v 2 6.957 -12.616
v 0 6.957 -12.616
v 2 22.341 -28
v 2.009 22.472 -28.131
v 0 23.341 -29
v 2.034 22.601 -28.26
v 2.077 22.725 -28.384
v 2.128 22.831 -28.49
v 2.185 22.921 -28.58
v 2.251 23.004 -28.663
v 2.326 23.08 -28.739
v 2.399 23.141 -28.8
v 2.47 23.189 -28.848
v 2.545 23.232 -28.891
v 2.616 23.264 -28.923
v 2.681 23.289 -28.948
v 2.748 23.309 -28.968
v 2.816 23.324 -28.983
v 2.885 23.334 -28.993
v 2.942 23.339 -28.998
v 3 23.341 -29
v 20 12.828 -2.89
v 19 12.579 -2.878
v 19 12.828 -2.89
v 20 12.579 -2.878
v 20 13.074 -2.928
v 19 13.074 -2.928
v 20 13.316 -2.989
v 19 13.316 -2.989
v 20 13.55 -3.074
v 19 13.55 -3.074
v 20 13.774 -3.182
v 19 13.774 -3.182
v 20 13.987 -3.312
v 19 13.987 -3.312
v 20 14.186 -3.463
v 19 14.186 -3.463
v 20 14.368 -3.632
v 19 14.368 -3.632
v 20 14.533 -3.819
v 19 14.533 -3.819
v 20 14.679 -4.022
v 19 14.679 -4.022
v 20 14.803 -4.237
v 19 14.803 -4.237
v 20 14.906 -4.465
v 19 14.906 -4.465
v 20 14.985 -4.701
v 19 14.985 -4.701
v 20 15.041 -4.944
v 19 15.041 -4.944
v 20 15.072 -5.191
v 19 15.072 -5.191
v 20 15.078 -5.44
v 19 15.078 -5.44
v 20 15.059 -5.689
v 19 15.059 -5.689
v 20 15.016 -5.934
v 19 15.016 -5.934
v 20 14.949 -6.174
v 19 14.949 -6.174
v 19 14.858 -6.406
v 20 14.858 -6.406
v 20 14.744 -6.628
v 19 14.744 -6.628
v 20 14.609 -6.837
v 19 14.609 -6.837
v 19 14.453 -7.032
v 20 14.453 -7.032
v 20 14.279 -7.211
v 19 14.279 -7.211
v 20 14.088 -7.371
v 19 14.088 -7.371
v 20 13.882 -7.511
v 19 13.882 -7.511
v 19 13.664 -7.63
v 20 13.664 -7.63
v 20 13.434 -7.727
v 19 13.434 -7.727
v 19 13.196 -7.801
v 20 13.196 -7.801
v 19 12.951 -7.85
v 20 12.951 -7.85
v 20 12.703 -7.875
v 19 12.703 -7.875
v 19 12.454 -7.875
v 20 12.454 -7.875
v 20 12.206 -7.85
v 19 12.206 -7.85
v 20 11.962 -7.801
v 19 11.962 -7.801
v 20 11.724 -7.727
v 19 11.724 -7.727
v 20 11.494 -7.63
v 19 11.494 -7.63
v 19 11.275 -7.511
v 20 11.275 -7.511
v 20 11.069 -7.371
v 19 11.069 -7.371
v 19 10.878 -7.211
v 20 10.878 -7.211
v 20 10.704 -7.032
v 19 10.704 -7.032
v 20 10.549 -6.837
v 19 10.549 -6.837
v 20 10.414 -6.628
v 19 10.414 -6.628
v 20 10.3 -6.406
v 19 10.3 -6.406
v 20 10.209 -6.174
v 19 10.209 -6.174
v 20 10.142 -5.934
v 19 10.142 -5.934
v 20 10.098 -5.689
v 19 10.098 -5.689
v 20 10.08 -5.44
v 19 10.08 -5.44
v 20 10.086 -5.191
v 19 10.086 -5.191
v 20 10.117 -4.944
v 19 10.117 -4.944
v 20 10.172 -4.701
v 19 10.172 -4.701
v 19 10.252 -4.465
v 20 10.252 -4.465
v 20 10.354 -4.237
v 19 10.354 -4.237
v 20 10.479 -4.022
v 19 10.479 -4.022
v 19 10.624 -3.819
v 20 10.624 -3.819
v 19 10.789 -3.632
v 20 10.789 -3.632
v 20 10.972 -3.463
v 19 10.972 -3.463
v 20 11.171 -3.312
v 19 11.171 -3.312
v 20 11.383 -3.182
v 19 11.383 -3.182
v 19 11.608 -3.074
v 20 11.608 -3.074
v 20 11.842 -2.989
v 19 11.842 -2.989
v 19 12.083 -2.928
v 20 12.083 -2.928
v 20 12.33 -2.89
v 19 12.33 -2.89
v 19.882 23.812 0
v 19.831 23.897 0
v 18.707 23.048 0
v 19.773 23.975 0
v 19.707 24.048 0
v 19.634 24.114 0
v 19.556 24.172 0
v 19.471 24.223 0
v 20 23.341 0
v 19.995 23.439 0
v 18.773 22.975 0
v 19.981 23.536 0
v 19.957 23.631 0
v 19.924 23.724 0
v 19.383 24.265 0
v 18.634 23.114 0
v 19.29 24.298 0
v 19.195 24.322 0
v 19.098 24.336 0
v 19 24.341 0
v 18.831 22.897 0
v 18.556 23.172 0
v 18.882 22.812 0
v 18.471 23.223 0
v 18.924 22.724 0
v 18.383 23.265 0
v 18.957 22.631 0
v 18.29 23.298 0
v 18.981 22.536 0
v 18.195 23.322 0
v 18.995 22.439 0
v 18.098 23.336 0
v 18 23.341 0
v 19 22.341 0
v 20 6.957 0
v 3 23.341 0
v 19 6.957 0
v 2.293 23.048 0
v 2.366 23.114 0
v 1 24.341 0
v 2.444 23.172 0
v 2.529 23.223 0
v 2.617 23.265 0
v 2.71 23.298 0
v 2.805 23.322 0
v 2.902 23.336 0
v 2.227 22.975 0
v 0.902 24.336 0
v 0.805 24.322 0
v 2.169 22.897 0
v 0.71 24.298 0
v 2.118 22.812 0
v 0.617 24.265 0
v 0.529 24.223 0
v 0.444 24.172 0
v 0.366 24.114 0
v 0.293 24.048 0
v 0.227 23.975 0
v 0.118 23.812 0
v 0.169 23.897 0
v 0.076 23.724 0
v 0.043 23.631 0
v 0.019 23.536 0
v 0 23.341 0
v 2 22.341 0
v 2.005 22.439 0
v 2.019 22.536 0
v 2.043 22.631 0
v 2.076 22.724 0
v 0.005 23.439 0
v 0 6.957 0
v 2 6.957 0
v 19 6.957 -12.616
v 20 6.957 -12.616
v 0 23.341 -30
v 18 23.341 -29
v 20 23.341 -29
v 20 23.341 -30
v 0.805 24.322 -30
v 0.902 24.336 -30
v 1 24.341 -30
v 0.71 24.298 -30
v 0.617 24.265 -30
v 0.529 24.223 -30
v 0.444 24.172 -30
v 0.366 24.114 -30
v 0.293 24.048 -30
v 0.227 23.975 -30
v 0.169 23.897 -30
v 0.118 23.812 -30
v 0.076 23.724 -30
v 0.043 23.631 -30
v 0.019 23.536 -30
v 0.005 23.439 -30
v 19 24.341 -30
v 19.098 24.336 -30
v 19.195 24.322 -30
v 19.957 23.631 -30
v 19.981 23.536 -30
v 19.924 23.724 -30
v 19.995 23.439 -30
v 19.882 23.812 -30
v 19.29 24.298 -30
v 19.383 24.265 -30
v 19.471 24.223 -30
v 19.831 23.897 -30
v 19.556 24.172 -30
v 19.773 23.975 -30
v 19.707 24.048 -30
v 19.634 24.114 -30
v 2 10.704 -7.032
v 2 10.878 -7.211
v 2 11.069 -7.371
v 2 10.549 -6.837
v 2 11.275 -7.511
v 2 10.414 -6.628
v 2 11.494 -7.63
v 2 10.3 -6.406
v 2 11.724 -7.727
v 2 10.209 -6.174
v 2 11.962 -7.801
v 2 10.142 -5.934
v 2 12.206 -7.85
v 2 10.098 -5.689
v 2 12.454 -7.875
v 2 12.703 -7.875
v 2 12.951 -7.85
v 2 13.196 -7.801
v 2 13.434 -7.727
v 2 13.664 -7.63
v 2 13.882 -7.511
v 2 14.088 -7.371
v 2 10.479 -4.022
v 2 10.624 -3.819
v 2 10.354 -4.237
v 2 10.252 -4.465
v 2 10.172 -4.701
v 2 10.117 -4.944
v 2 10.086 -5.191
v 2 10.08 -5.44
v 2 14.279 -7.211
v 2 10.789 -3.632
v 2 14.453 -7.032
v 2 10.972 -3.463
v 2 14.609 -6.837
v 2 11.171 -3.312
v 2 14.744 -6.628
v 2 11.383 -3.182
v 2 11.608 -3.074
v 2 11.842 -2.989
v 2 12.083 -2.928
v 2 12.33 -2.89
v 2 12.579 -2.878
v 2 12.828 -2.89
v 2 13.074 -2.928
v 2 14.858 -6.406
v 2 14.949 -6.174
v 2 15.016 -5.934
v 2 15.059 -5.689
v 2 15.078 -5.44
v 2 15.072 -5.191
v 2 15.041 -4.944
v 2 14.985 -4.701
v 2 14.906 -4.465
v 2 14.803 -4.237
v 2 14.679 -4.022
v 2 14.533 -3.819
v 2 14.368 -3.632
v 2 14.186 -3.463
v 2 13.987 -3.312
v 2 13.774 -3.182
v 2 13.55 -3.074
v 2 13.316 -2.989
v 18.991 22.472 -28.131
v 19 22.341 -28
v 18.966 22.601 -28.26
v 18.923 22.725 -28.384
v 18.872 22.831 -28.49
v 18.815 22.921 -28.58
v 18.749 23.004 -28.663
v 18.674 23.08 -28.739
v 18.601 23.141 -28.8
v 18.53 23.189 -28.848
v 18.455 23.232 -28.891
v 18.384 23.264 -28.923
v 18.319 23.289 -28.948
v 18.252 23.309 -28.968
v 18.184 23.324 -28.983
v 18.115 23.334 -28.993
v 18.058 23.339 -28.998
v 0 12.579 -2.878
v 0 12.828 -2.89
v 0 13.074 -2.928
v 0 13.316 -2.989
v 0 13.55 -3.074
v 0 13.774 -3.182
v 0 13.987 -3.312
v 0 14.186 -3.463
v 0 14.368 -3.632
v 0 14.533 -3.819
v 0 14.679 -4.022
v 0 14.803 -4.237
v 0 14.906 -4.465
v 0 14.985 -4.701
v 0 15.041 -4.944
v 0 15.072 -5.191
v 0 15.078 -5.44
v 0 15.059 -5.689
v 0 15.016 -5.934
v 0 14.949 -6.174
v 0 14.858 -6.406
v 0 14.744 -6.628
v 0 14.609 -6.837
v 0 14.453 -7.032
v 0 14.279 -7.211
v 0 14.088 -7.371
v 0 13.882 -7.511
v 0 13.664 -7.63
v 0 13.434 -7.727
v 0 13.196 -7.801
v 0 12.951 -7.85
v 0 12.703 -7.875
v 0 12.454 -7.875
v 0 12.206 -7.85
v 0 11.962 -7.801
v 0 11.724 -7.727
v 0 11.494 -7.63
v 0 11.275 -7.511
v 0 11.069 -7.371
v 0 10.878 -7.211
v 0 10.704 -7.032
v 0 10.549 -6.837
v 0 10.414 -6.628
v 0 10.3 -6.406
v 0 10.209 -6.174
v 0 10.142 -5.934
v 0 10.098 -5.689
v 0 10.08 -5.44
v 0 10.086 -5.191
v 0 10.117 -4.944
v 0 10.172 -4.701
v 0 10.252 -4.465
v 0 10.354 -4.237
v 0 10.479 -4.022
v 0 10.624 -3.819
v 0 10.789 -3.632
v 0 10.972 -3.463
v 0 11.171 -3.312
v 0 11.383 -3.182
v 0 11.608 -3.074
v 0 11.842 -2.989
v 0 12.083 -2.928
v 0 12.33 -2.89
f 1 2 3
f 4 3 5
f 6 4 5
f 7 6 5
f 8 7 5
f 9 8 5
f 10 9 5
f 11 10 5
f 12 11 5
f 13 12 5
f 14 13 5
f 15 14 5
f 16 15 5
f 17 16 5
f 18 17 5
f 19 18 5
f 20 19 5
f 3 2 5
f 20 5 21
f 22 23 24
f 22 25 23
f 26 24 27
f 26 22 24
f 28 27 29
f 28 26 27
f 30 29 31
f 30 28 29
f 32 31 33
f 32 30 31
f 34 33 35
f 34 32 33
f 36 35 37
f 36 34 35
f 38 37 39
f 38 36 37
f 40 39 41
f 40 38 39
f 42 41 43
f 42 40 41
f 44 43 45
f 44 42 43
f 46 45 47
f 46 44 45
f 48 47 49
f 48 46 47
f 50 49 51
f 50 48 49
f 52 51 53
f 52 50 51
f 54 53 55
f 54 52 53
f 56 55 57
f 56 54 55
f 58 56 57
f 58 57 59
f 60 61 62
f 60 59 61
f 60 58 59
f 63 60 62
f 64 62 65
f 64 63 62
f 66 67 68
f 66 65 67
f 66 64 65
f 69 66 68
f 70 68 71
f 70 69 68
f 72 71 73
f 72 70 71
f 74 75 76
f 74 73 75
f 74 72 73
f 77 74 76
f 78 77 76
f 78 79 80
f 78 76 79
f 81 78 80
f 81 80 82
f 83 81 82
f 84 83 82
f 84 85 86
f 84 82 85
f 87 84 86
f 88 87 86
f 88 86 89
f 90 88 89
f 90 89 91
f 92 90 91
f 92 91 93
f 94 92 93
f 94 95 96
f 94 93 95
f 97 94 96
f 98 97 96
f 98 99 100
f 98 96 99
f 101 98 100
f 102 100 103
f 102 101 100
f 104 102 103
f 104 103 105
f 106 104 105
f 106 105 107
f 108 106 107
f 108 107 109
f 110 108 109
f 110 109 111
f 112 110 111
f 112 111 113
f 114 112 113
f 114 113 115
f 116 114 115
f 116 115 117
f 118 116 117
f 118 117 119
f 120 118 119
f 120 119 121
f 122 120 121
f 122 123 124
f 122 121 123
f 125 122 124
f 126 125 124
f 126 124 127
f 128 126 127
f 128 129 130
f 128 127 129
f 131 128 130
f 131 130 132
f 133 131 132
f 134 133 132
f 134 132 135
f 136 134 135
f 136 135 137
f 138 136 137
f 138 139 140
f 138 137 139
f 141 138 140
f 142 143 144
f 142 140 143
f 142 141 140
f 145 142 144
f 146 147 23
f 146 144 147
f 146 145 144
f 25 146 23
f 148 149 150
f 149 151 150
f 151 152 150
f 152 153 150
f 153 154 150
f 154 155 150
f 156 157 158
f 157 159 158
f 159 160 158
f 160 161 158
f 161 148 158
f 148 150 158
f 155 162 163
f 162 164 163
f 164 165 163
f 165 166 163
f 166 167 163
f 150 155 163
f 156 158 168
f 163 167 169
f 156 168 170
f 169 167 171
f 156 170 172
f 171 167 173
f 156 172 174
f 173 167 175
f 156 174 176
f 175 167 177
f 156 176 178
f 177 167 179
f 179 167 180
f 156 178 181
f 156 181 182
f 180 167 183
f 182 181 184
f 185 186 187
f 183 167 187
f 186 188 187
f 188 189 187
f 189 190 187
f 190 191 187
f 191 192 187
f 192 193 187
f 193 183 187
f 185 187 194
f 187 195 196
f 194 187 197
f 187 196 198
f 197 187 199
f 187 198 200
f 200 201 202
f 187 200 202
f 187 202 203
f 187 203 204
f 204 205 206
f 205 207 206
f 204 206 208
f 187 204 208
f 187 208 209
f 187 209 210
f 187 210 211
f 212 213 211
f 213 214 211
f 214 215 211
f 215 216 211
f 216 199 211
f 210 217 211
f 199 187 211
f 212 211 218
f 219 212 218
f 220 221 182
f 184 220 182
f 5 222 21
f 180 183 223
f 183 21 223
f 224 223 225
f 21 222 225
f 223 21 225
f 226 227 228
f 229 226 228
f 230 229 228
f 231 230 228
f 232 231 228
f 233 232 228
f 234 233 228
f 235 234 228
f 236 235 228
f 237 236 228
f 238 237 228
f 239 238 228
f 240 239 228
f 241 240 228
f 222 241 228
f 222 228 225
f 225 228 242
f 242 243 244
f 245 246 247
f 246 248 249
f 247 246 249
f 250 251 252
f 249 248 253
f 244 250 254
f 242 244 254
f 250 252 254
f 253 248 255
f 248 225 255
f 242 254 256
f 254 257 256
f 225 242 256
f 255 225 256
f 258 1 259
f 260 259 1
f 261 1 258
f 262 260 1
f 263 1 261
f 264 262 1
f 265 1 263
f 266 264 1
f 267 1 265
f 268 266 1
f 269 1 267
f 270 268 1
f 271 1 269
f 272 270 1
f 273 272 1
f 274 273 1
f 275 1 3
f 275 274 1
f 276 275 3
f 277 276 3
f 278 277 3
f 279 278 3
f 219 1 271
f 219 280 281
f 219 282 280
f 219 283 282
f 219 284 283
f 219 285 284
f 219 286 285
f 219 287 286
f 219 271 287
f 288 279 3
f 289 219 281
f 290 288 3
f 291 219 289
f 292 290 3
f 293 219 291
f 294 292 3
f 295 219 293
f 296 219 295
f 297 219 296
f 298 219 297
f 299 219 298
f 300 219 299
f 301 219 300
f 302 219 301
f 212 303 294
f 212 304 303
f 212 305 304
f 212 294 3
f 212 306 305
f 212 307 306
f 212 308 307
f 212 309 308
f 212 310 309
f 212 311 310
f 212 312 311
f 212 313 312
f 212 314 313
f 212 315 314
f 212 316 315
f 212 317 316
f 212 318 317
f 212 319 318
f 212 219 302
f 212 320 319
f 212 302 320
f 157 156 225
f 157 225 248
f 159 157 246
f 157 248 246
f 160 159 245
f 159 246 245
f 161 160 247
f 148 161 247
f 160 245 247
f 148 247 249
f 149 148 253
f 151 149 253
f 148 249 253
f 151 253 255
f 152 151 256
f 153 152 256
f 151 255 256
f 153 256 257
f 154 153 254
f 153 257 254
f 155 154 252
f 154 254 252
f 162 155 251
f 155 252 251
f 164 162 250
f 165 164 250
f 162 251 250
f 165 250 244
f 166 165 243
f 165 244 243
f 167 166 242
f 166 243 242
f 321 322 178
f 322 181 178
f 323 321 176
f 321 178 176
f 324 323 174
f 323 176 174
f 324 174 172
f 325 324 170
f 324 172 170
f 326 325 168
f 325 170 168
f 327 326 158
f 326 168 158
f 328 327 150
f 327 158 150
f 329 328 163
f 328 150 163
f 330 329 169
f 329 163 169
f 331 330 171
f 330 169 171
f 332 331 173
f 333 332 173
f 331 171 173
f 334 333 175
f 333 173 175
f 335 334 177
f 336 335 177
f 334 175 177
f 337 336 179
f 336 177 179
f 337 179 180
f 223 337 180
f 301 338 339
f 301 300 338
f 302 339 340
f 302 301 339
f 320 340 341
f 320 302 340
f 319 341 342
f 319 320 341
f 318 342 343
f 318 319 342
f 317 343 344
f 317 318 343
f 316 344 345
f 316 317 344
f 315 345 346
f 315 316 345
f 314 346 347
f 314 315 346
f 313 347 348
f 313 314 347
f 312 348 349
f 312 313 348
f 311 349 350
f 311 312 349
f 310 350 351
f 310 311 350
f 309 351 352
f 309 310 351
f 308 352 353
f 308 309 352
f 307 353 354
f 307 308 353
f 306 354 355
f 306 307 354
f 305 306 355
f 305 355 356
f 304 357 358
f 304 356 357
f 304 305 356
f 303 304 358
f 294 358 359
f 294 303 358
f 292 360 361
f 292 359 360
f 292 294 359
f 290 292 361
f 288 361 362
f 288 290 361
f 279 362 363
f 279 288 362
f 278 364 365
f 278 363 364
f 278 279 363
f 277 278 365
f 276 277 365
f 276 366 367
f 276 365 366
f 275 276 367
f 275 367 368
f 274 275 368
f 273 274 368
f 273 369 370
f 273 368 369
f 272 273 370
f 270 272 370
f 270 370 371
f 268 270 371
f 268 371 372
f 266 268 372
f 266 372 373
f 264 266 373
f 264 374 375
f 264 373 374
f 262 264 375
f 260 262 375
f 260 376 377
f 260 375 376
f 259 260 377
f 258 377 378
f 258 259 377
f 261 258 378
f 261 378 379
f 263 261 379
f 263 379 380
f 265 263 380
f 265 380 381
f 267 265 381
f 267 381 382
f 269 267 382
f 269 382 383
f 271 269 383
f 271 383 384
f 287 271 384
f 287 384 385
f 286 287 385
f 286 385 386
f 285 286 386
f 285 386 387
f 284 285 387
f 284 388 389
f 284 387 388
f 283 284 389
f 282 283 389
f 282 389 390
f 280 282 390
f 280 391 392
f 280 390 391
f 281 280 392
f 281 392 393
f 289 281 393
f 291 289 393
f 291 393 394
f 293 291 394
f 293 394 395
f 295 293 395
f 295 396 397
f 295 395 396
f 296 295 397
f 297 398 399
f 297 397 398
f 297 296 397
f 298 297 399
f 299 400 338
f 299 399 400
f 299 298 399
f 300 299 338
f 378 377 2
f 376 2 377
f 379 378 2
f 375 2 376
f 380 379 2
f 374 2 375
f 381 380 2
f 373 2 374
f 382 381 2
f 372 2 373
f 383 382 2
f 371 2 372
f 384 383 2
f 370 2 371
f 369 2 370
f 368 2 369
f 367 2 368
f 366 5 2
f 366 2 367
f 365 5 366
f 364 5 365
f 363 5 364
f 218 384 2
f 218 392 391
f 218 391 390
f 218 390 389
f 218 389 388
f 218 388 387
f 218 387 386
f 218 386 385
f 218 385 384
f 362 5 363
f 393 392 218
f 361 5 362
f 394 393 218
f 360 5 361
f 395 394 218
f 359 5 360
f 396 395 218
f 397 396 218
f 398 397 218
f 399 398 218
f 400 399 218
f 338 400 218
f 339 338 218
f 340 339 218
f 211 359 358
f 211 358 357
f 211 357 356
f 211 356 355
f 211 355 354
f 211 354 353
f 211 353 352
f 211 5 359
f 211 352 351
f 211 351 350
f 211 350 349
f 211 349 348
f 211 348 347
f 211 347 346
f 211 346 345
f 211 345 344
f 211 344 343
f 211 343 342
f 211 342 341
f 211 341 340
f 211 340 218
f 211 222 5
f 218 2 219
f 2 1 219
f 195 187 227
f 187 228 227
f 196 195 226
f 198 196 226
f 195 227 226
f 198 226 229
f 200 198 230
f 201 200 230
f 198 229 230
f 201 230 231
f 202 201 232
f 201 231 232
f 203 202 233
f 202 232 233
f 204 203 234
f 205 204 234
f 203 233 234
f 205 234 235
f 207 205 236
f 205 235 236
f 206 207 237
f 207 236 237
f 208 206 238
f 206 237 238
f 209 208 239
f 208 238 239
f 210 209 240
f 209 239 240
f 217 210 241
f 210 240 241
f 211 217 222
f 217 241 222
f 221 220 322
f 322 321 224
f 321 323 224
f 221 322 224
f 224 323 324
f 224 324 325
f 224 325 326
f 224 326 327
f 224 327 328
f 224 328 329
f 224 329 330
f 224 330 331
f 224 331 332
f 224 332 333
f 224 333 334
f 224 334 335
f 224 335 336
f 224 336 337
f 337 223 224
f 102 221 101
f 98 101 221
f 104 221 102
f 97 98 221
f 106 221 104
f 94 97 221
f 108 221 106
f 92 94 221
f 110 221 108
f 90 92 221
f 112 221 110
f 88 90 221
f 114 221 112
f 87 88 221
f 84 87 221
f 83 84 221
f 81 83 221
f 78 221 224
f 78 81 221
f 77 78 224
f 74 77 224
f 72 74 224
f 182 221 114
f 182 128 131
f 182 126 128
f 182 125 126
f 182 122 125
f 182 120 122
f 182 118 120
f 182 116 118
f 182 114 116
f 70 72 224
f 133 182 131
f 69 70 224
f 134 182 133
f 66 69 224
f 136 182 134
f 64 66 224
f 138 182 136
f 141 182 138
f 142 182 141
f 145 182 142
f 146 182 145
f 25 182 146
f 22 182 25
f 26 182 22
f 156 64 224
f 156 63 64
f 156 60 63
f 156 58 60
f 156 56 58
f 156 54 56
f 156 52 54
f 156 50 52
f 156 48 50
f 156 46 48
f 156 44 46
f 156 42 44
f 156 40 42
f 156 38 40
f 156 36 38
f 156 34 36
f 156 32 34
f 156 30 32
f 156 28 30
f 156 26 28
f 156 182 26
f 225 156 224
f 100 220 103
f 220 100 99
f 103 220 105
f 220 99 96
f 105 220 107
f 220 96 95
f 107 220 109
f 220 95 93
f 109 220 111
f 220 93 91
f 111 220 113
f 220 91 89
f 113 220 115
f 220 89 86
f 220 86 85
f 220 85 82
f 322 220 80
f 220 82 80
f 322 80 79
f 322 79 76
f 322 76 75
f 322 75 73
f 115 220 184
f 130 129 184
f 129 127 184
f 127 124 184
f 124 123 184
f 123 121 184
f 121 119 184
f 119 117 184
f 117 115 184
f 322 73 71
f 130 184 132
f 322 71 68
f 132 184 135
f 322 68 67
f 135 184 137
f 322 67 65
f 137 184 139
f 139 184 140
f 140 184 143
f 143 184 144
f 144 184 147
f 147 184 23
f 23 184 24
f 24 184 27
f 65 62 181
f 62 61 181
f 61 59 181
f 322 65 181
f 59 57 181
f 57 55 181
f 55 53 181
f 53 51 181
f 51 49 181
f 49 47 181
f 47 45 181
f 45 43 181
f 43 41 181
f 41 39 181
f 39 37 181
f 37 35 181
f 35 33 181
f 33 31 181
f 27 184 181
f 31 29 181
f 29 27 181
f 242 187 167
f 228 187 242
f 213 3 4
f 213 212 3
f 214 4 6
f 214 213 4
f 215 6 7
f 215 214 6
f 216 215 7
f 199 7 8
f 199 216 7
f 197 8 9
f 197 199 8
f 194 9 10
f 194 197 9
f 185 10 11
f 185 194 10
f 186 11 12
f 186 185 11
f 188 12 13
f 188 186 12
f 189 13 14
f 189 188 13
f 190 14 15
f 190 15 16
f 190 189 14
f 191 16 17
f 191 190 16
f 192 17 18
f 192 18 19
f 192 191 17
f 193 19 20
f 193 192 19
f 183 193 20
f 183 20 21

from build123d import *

# Parameters (mm, degrees)
BOSS_EXTRUDE1_DEPTH     = 1
SKETCH2_W               = 20
SKETCH2_H               = 30
BOSS_EXTRUDE2_DEPTH     = 1
MIRROR1_START           = 1
MIRROR1_DEPTH           = 1
MIRROR1_START_2         = 19
MIRROR1_2_DEPTH         = 1
FILLET1_R               = 1
CUT_EXTRUDE1_DEPTH      = 44.502679315
CUT_EXTRUDE1_DEPTH_BACK = 44.502679315
SKETCH3_R               = 2.5
CUT_EXTRUDE2_DEPTH      = 44.502679315
CUT_EXTRUDE2_DEPTH_BACK = 44.502679315
SKETCH4_W               = 27.584874686
SKETCH4_H               = 17.882608418


# Read off the part's stored shape, not the designer's step: Mirror1
with BuildPart() as part:
    # Sketch1 → Boss-Extrude1 (new body)
    with BuildSketch(Plane(origin=(0, 0, 0), x_dir=(0, 0, -1), z_dir=(1, 0, 0))):
        Polygon((0, 24.340975897), (30, 24.340975897), (0, -5.659024103), align=None)
    extrude(amount=BOSS_EXTRUDE1_DEPTH)

    # Sketch2 → Boss-Extrude2 (add)
    with BuildSketch(Plane(origin=(0, 24.340975897, 0), x_dir=(1, 0, 0), z_dir=(0, 1, 0))):
        with Locations((10, 15)):
            Rectangle(SKETCH2_W, SKETCH2_H)
    extrude(amount=-BOSS_EXTRUDE2_DEPTH)

    # Mirror1 outline → Mirror1 (add)
    with BuildSketch(Plane.YZ.offset(MIRROR1_START)):
        Polygon((-5.659024103, 0), (23.340975897, -29), (23.340975897, 0), align=None)
    extrude(amount=MIRROR1_DEPTH)

    # Mirror1 2 outline → Mirror1 2 (add)
    with BuildSketch(Plane.YZ.offset(MIRROR1_START_2)):
        Polygon((-5.659024103, 0), (23.340975897, -29), (23.340975897, 0), align=None)
    extrude(amount=MIRROR1_2_DEPTH)

    # Fillet1
    fillet1_edges = [part.edges().sort_by_distance(p)[0] for p in [
        (20, 24.340975897, -15),
        (19, 23.340975897, -14.5),
        (0, 24.340975897, -15),
        (2, 23.340975897, -14.5),
    ]]
    fillet(fillet1_edges, radius=FILLET1_R - 0.0001)  # a hair under: the kernel refuses the full size

    # Sketch3 → Cut-Extrude1 (cut, two sides: drawn at the far end of the back side and taken through both)
    with BuildSketch(Plane.ZY.offset(-CUT_EXTRUDE1_DEPTH_BACK)):
        with Locations((-5.377949805, 12.578820342)):
            Circle(SKETCH3_R)
    extrude(amount=CUT_EXTRUDE1_DEPTH + CUT_EXTRUDE1_DEPTH_BACK, mode=Mode.SUBTRACT)

    # Sketch4 → Cut-Extrude2 (cut, two sides: drawn at the far end of the back side and taken through both)
    with BuildSketch(Plane.ZY.offset(-CUT_EXTRUDE2_DEPTH_BACK)):
        with Locations((-7.379594799, -1.984577464)):
            Rectangle(SKETCH4_W, SKETCH4_H)
    extrude(amount=CUT_EXTRUDE2_DEPTH + CUT_EXTRUDE2_DEPTH_BACK, mode=Mode.SUBTRACT)


solid = part.part
